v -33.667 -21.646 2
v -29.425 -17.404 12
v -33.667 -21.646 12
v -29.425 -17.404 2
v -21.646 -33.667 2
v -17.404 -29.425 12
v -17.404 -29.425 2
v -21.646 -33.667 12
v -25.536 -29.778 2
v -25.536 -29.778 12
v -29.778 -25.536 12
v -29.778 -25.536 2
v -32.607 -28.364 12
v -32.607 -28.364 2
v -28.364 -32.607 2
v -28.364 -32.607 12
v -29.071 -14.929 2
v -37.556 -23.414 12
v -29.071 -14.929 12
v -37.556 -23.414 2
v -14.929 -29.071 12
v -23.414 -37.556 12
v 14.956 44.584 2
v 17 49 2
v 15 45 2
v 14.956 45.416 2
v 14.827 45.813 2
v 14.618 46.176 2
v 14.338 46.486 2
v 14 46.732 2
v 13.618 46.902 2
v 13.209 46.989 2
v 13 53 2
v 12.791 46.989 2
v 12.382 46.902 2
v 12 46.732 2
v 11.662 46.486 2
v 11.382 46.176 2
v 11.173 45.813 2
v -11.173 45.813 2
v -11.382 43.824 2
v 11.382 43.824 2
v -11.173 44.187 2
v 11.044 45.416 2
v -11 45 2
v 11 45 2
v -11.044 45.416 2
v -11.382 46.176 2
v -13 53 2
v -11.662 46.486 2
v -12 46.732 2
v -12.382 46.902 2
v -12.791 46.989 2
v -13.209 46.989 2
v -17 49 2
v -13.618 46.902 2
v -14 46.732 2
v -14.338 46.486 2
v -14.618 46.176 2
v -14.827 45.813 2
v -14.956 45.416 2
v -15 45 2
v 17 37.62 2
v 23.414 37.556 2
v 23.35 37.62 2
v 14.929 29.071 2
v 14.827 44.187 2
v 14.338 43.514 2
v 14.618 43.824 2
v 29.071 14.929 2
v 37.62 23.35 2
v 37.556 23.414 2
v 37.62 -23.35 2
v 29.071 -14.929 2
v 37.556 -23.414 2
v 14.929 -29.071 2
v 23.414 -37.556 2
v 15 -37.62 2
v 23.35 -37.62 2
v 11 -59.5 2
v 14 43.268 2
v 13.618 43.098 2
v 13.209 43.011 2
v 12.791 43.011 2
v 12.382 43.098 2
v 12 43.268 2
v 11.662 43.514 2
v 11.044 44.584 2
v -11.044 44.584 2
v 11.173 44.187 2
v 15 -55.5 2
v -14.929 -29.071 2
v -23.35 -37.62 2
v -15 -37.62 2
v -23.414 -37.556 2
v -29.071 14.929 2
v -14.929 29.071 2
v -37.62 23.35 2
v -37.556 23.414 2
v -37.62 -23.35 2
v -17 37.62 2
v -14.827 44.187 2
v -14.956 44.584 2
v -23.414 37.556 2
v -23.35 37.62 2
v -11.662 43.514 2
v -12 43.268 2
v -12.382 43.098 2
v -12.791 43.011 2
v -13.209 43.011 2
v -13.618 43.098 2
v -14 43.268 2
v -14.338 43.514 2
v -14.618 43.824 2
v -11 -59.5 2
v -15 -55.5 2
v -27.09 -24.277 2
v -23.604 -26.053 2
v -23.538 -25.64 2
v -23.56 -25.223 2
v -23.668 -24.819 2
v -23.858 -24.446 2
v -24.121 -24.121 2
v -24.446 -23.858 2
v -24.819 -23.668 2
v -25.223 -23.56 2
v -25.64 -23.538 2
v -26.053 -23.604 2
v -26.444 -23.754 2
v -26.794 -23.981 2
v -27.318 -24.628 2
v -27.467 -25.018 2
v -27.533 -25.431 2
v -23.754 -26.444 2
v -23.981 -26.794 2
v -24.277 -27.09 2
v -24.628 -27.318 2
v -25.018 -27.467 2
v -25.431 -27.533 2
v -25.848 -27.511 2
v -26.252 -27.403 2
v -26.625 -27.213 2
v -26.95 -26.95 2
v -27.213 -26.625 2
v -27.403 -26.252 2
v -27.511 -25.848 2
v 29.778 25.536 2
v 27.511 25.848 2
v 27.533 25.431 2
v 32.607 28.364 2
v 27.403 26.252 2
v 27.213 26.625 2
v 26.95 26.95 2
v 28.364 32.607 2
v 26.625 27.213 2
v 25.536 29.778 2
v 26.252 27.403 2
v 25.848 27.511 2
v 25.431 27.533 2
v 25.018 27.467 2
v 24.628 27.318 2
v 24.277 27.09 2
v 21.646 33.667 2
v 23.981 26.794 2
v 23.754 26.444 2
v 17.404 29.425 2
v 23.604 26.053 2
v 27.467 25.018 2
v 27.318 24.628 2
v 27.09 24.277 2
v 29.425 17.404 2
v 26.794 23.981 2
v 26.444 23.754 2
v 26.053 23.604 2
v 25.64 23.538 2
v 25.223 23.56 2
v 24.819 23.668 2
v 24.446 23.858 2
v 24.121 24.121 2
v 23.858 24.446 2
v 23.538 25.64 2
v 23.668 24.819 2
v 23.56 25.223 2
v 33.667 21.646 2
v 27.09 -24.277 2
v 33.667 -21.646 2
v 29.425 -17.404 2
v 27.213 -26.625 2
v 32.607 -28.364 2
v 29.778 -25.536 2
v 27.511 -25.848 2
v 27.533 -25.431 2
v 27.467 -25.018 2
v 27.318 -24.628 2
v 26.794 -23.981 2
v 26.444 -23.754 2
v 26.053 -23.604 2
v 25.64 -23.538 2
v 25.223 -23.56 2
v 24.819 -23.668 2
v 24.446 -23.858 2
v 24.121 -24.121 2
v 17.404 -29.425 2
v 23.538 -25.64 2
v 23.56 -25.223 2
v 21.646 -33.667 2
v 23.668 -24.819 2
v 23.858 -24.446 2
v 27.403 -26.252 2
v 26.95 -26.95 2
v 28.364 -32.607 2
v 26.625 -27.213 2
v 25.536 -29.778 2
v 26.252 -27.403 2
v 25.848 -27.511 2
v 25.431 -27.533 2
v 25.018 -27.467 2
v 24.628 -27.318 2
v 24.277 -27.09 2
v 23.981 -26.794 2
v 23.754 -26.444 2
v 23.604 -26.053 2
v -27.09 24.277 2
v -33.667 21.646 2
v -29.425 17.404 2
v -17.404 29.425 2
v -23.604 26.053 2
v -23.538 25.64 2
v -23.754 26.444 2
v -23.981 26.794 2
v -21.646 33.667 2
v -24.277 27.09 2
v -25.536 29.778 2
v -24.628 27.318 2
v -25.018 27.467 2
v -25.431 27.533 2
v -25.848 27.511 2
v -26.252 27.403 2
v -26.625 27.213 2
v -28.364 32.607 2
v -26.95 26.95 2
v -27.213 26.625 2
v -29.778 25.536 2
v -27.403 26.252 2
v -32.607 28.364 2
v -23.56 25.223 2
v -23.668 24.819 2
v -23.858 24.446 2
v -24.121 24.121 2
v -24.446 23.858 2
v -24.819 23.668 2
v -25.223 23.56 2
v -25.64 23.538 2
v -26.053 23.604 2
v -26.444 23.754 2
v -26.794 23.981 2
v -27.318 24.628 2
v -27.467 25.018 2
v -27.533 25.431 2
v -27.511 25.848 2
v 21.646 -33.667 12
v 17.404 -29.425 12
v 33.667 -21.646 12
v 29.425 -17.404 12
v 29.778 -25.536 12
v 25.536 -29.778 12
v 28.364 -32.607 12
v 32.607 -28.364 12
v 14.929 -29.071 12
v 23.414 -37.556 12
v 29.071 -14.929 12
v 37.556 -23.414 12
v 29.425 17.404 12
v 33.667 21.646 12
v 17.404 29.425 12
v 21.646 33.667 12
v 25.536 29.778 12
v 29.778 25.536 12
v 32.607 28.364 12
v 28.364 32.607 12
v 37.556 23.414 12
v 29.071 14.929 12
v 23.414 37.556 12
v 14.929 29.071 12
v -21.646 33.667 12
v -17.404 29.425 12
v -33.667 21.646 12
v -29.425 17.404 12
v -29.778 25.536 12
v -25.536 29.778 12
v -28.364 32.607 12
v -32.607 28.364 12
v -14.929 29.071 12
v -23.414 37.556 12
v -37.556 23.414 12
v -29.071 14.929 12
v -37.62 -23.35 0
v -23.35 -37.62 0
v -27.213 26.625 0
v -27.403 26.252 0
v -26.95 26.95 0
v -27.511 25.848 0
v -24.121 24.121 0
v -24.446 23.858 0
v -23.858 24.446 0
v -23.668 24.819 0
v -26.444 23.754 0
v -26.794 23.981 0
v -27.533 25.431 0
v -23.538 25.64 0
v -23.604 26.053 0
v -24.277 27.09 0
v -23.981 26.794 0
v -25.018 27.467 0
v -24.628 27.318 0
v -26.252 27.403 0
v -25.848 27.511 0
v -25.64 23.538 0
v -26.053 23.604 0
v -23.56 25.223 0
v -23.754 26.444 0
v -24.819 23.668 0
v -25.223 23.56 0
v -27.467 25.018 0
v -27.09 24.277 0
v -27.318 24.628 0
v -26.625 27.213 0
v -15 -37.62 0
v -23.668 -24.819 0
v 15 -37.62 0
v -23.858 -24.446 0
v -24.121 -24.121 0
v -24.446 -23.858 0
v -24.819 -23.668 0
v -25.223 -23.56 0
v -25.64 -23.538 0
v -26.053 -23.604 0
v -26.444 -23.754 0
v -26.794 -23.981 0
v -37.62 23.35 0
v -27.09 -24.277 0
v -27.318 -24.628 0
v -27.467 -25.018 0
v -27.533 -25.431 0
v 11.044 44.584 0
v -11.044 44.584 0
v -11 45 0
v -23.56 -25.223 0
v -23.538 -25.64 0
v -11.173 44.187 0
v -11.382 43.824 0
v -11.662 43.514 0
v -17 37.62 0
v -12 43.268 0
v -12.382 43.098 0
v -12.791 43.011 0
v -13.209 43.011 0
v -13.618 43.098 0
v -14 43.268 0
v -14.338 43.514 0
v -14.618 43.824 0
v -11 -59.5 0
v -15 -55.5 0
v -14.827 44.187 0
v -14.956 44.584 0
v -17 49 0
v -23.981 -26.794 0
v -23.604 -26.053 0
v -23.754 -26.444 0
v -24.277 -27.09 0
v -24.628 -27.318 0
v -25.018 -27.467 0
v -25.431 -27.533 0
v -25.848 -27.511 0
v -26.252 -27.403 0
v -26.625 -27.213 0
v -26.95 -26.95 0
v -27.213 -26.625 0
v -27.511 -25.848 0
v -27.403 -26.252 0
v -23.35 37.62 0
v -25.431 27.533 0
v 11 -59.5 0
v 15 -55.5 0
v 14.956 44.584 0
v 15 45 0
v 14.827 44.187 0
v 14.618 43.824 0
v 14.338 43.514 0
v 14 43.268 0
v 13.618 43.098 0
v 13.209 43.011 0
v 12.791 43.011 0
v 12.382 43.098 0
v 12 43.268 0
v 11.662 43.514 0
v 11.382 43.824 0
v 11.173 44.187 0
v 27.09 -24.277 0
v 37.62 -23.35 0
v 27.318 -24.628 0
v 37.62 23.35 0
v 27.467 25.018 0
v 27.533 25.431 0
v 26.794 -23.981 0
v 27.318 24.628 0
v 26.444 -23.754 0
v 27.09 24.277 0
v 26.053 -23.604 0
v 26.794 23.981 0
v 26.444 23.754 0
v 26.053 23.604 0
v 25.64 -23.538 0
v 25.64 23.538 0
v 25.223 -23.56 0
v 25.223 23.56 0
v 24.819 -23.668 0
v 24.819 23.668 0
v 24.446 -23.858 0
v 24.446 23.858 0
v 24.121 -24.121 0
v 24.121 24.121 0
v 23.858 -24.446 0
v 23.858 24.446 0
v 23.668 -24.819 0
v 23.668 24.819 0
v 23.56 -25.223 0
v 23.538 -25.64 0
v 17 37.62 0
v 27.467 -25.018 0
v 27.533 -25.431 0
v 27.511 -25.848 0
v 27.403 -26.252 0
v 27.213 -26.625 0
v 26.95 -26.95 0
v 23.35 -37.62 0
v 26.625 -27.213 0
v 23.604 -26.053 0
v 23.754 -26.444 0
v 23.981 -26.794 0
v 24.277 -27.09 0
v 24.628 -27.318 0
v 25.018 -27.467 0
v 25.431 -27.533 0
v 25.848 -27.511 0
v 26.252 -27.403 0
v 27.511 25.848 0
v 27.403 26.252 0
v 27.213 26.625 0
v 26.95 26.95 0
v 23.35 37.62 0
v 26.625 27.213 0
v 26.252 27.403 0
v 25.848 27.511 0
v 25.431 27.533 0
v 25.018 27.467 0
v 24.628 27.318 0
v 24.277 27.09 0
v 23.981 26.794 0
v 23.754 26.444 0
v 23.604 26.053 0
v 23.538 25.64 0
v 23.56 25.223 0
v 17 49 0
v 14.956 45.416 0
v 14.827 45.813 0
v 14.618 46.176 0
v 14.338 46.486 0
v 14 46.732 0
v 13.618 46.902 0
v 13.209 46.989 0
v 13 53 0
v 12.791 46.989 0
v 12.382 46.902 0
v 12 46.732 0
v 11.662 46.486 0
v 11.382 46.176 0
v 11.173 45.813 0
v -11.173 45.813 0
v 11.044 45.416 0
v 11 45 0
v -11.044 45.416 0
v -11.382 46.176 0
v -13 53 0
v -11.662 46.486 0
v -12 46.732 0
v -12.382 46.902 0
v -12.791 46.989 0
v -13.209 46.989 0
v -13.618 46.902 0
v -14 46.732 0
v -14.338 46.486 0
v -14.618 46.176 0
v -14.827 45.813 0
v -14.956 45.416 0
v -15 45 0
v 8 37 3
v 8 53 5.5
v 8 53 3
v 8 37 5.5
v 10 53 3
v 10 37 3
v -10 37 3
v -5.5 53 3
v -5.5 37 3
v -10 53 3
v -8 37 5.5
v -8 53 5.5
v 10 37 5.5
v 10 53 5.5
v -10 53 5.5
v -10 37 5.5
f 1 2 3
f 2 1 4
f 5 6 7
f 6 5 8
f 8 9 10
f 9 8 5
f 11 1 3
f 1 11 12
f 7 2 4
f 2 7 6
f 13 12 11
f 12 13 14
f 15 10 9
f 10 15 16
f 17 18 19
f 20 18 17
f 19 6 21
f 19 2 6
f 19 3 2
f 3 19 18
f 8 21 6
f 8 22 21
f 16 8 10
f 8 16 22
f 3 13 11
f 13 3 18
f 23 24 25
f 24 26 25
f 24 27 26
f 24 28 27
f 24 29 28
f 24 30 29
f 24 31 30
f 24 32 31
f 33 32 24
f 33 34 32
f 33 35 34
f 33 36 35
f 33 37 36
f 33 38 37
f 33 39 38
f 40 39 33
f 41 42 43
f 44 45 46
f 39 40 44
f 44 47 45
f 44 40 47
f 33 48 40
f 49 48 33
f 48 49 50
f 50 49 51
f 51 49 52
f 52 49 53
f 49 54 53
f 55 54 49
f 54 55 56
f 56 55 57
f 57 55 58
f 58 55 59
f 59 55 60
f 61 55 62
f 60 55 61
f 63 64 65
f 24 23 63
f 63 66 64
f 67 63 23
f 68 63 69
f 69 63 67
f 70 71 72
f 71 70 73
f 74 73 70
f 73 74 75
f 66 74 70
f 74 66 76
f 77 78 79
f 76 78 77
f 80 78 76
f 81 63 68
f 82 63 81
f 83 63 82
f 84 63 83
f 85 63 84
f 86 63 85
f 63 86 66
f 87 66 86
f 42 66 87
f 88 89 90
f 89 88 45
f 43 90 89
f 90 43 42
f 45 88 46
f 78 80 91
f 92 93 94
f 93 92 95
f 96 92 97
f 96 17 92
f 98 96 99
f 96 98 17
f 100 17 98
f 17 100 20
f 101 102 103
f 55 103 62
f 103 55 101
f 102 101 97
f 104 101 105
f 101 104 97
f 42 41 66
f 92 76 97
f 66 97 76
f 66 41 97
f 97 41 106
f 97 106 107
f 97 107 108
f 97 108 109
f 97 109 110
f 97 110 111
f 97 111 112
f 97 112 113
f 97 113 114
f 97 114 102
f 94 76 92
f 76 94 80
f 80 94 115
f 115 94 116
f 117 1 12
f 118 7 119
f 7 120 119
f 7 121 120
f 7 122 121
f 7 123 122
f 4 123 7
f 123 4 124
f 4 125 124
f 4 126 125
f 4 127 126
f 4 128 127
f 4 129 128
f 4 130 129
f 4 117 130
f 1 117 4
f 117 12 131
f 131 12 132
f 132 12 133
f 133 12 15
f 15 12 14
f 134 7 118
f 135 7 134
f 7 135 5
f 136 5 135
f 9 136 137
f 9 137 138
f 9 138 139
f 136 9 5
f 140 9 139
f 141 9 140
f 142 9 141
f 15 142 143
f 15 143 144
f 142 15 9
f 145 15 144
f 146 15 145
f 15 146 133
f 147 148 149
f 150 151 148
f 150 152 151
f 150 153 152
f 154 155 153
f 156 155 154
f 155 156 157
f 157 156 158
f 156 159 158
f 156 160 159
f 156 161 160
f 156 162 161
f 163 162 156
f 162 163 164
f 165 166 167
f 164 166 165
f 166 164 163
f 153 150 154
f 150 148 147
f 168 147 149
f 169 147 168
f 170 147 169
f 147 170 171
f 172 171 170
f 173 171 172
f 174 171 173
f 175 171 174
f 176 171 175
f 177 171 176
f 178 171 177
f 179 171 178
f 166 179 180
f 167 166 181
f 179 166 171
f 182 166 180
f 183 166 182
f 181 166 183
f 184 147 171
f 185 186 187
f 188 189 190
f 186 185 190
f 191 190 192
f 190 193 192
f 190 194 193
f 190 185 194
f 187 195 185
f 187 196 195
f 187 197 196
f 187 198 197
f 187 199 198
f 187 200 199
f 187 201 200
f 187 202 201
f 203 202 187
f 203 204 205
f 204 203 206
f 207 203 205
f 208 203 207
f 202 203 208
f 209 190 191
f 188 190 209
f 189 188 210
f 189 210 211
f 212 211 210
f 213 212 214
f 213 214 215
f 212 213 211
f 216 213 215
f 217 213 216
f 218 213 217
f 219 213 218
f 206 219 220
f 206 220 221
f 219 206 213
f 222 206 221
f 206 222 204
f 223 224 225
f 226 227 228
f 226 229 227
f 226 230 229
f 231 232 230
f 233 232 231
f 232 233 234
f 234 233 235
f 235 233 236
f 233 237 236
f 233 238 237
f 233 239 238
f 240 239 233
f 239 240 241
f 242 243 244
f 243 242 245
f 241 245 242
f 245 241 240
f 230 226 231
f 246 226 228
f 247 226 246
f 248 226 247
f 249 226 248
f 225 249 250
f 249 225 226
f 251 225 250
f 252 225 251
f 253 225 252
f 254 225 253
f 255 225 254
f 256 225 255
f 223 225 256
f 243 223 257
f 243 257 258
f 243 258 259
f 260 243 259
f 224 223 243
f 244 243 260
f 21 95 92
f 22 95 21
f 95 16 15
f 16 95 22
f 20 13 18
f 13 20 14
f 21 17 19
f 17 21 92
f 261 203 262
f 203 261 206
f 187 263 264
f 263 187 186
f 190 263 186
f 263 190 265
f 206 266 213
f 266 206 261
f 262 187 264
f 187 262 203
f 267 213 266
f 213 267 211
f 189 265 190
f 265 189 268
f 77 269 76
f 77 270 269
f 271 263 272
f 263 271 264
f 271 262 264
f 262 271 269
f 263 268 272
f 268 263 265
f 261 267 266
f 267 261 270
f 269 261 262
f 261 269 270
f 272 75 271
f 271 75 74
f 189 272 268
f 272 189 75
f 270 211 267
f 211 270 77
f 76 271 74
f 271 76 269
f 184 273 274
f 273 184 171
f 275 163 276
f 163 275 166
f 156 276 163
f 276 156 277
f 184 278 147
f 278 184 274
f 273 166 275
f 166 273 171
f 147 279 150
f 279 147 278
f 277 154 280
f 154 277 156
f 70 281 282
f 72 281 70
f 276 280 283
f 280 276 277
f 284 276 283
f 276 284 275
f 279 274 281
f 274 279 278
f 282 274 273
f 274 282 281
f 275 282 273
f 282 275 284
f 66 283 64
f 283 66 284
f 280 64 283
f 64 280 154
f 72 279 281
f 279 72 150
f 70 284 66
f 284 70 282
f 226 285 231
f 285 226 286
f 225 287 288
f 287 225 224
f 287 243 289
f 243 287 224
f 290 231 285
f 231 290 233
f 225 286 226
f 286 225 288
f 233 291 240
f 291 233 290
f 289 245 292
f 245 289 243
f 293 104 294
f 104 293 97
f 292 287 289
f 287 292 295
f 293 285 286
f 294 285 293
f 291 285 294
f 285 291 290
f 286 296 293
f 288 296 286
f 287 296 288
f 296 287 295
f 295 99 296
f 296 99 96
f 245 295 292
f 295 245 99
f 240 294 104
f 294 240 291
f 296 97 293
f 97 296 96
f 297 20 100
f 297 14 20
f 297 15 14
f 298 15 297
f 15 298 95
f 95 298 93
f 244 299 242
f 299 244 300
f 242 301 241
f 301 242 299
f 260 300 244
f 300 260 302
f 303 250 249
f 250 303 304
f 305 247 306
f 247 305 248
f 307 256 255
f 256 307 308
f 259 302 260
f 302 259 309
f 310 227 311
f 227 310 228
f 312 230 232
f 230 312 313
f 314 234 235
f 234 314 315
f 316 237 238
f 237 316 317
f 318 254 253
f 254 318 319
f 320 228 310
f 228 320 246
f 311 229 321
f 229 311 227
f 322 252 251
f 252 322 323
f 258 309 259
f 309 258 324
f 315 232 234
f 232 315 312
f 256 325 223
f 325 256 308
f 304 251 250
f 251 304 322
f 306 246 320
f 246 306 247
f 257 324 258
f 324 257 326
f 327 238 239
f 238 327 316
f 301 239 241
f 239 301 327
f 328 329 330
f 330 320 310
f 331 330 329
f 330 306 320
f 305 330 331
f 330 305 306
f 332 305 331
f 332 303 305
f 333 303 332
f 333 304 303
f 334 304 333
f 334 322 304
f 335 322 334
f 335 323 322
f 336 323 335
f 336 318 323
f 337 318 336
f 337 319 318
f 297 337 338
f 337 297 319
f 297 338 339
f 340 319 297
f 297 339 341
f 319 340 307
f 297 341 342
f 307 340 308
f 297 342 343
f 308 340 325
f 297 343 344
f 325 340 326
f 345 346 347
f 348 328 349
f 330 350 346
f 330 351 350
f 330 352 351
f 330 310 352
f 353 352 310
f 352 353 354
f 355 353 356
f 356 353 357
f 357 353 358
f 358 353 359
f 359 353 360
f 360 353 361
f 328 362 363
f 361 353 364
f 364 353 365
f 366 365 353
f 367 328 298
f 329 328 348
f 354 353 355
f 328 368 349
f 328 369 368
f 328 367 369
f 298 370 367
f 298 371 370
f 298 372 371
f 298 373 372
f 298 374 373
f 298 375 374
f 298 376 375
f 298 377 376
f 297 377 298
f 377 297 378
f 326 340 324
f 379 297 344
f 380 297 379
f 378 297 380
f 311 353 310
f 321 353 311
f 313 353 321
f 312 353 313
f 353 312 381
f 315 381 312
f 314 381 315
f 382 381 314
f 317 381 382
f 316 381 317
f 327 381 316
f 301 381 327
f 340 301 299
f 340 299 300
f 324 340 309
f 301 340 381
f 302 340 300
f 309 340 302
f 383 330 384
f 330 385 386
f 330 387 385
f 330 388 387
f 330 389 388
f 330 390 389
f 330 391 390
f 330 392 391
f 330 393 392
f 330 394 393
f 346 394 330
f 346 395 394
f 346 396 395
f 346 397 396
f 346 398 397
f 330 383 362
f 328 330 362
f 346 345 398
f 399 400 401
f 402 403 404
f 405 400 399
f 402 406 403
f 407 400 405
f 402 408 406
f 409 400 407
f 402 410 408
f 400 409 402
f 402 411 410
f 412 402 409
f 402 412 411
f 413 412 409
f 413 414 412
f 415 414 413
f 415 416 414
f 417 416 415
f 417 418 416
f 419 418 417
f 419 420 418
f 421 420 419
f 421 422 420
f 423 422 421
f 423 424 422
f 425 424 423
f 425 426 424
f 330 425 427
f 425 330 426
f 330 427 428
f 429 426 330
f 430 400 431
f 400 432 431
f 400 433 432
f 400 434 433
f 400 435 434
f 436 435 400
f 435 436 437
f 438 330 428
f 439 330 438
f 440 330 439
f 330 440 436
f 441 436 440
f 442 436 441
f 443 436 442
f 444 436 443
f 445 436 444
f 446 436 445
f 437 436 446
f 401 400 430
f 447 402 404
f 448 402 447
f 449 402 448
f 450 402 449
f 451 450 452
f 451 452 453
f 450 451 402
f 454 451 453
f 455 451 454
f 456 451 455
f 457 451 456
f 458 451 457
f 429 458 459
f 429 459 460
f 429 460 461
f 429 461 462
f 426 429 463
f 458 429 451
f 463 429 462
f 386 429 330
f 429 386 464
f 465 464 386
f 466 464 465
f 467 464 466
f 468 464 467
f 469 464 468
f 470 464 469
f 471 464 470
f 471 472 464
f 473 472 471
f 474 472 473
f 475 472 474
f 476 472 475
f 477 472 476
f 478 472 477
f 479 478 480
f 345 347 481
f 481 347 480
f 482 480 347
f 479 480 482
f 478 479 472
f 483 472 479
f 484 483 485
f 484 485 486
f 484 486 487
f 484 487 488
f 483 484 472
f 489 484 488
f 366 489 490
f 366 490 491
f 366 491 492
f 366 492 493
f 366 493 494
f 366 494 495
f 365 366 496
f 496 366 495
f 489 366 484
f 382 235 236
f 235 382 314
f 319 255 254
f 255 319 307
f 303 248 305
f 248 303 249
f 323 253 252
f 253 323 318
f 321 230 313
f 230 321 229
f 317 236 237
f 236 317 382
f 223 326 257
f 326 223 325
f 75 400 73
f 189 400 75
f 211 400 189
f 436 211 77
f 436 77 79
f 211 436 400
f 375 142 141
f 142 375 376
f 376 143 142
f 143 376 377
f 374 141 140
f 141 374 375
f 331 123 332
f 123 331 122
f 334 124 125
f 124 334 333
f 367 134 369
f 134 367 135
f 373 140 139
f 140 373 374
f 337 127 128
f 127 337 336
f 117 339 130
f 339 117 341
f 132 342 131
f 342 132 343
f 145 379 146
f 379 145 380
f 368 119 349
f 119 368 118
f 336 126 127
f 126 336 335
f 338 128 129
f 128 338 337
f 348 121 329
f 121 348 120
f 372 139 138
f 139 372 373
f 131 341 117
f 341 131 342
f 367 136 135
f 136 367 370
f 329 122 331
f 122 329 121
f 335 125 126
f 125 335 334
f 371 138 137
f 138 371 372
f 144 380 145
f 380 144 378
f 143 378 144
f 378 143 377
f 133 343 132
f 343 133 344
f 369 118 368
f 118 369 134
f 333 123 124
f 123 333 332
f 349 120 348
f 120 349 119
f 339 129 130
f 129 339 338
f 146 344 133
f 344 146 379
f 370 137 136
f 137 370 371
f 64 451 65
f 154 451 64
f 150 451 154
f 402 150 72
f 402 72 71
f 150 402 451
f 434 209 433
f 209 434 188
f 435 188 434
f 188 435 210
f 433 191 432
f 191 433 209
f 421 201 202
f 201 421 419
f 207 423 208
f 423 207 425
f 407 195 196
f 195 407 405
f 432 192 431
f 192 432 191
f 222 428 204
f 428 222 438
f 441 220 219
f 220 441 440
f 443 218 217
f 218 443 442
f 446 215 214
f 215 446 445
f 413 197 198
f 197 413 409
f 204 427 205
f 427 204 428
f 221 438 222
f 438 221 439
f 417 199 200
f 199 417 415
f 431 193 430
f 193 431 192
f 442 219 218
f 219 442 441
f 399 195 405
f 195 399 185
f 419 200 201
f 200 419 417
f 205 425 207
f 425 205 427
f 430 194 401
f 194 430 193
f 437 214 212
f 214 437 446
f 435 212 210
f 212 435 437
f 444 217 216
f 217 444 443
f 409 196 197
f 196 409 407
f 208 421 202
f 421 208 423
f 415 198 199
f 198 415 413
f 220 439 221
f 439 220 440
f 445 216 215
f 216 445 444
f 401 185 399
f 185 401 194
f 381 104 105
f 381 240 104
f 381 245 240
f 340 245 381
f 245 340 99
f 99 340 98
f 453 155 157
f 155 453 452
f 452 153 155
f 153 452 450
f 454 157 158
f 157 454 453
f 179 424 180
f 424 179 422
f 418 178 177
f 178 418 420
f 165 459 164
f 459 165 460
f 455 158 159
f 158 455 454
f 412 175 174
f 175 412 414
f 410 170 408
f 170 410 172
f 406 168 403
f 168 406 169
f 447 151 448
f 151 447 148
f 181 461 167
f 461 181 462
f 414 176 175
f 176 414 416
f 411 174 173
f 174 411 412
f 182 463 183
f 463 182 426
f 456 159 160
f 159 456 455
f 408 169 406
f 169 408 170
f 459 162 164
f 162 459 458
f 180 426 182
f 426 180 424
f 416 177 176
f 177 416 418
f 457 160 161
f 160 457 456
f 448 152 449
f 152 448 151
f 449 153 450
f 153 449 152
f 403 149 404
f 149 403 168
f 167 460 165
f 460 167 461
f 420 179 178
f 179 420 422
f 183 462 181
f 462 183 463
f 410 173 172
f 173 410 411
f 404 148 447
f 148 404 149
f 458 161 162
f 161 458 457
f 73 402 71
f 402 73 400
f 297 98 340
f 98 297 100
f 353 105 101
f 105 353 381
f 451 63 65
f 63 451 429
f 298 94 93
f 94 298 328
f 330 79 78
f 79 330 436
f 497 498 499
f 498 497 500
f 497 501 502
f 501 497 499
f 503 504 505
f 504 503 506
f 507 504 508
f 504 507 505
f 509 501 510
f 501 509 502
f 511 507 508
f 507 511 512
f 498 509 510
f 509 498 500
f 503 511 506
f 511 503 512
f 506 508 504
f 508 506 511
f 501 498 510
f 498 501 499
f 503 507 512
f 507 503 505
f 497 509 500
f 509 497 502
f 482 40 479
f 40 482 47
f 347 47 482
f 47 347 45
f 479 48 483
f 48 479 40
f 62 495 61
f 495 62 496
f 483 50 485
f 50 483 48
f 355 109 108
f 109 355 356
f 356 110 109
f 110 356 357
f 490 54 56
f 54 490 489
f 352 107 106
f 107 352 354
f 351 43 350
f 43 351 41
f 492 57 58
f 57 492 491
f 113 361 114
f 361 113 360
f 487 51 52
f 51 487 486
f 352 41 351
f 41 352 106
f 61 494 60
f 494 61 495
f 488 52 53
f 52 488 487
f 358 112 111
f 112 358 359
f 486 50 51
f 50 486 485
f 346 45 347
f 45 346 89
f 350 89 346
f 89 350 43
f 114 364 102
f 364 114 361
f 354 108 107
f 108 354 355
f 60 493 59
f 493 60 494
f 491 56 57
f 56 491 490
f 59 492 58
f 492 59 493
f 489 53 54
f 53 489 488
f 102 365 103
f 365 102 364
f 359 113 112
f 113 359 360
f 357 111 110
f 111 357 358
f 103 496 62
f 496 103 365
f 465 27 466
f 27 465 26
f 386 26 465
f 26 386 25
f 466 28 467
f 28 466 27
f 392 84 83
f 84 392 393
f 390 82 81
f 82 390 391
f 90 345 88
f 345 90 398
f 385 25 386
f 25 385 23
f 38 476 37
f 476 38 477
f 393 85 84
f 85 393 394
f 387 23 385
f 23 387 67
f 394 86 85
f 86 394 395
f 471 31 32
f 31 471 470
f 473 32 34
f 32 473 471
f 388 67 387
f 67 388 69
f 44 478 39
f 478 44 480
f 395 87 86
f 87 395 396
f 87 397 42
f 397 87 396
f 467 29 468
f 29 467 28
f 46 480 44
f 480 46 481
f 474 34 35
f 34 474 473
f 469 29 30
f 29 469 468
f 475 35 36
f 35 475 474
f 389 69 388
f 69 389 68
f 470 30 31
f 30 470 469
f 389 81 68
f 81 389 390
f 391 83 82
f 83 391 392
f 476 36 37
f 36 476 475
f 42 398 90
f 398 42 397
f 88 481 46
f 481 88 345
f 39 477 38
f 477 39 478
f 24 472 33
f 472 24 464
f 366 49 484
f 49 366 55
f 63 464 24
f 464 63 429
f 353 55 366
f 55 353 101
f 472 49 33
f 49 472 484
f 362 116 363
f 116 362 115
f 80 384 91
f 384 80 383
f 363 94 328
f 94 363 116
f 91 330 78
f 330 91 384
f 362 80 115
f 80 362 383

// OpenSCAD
// file: brackets.scad
//Creates a bracket that looks like this:
/*
 *      #     |
 *      #     | length
 *      #     |
 *  ######### | | boomWidth
 *  ---------
 *    width
 */
module tBracket(boomWidth, width, length, height)
{
    //xAxis boom
    cube([width, boomWidth, height]);

    //yAxis boom
    translate([width/2 - boomWidth / 2, 0,0])
    cube([boomWidth, length, height]);
}
// main file
$fn=30;
include <brackets.scad>

module bracketTest()
{
    difference()
    {
        cube([18.5, 12, 10]);
    
        translate([1, 2.2, 2])
        tBracket(6, 15+1.5, 10, 9);
    }
}

//bracketTest();

module armBracket(width, length, height, barWidth, tWidth, tLength, edgeDistance) 
{
    difference()
    {
        cube([width, length, height]);
        
        translate([width / 2 - tWidth /2, edgeDistance, -1])
        tBracket(barWidth, tWidth, tLength,  height * 2);
    }
}

module xt60Plug()
{
    height = 4;
    width  = 16;
    length = 16;
    
    cornerHeight = 1.5;

    for(i = [0, 1])
    {
        mirror([0,0,i])
        difference()
        {
            cube([width, length, height]);

            //Chopping off the corners
            translate([0,-1,cornerHeight])
            rotate(-45, [0,1,0])
            cube([10, length*2, 10]);

        }
    }
}
module xt60Bottom()
{
    height = (8-3) / 2;
    width = 16;
    length = 16;

    edgeWidth = 4;
    outsideWidth = width + edgeWidth;

    xt60Height = 8;
    
    difference()
    {
        cube([outsideWidth, length, height]);

        translate([edgeWidth / 2, -1, xt60Height / 2])
        scale([1, 10, 1])
        xt60Plug();
    }
}

module xt60Holder(bottomThickness, chamferBoth=false)
{
    length = 16;
    holderWidth = 20;
    //bottomThickness = 3;
    bottomWidth = holderWidth + 14;

    screwDistance = holderWidth / 2 + 3;
    screwholeDiameter = 4;
    cornerCutDistance = 4;

    translate([-holderWidth/2, 0, 3])
    {
        xt60Bottom();
    }

    difference()
    {
        translate([-bottomWidth / 2, 0, 0])
        {
            cube([bottomWidth, length, bottomThickness]);
        }

        //Screwholes
        for(i = [-1,1])
        {
            translate([i * screwDistance, length/2, -1])
            cylinder(h=bottomThickness * 2, d=screwholeDiameter);
        }

        //cutting off the corners
        for(i = [0,1])
        {
            mirror([i,0,0])
            translate([bottomWidth / 2 - cornerCutDistance, length, -1])
            rotate(-45)
            cube([10, 10, 10]);
        }

        if(chamferBoth)
        {
            for(i = [0, 1])
            {
                mirror([i, 0, 0])
                translate([bottomWidth / 2 - cornerCutDistance, 0, -1])
                rotate(-45)
                cube([10, 10, 10]);
            }
        }
    }
}

module body(fcSize, thickness, bracketHeight, xt60=false, radio=false)
{
    bracketWidth = 20;
    bracketLength = 12;
    bracketBarWidth = 6;
    tWidth = 17;
    tLength = 15;
    bracketEdgeDistance = 2;
    screwholeDiameter = 4;

    cutterWidth = 100;

    addedSize = 4;
    finalSize = fcSize + addedSize;

    //bottomSize = finalSize + (sqrt(pow(bracketWidth / 2, 2) + pow(bracketLength, 2))) + 
            //sqrt(pow(bracketHeight, 2) * 2);
    bottomSize = finalSize + 2 * sqrt(pow(bracketWidth / 2, 2) + pow(bracketLength, 2));
    
    //Calculating the distance that the brackets need to be moved
    //for the flight controller to fit
    bracketDistance = sqrt(pow(finalSize / 2, 2) * 2);

    translate([0, 0, thickness])
    for(i = [1:4])
    {
        rotate(45 + 90 * i)
        {
            //Center the bracket and move it forward
            translate([-bracketWidth / 2, bracketDistance, 0])
            armBracket(bracketWidth, bracketLength, bracketHeight, bracketBarWidth, tWidth, tLength, bracketEdgeDistance);
        }
    }
    
    difference()
    {
        //Bottom plate
        translate([-bottomSize / 2, -bottomSize / 2, 0])
        cube([bottomSize, bottomSize, thickness]);

        //Cutting of the corners
        for(i = [1 : 4])
        {
            rotate(45 + 90*i)
            {
                translate([-cutterWidth / 2, bracketDistance + bracketLength, -1])
                {
                    cube([cutterWidth, 100, thickness * 3]);
                }
                
                //Screw holes
                translate([bracketDistance + bracketEdgeDistance + bracketBarWidth / 2, 0, 0])
                {
                    cylinder(h=bracketHeight, d=screwholeDiameter, centered = true);
                }
            }
        }
    }
    
    xt60Length = 15;
    if(xt60)
    {
        translate([0, finalSize/2 + xt60Length, 0])
        xt60Holder(thickness);
    }

    //Creating the radio holder
    radioHolderWidth = 30;
    radioHolderLength = 25;
    radioCutWidth = 4;

    if(radio)
    {
        rotate(180) //Turning it over to the other side, this avoids unnesssairy transforms
        {
            translate([-radioHolderWidth / 2, finalSize / 2 + radioHolderLength / 2, 0])
            {
                difference()
                {
                    cube([radioHolderWidth, radioHolderLength, thickness]);

                    //Cutting the corners a bit
                    translate([radioHolderWidth / 2, 0, 0])
                    for(i = [0,1])
                    {
                        mirror([i, 0, 0])
                        {
                            translate([radioHolderWidth / 2 - radioCutWidth, radioHolderLength, -1])
                            rotate(-45)
                            cube([10, 10, thickness * 2]);
                        }
                    }
                }
            }
        }
    }
}


FC_SIZE = 40;
THICKNESS = 2;
BATTERY_WIDTH = 45;
STRAP_WIDTH = 30;
STRAP_HOLE_LENGTH = 5;

module bottom()
{
    bracketHeight = 10;
    body(FC_SIZE, THICKNESS, bracketHeight, xt60 = true, radio = true);
}
module top()
{
    bracketHeight = 3;
    difference()
    {
        body(FC_SIZE, THICKNESS, bracketHeight);

        //Battery strap hole
        for(i = [-1,1])
        {
            translate([-STRAP_WIDTH / 2, i * BATTERY_WIDTH / 2 - STRAP_HOLE_LENGTH / 2, -1])
            cube([STRAP_WIDTH, STRAP_HOLE_LENGTH, THICKNESS * 2]);
        }
    }
}

bottom();
//top();

//xt60Holder(chamferBoth = true);
